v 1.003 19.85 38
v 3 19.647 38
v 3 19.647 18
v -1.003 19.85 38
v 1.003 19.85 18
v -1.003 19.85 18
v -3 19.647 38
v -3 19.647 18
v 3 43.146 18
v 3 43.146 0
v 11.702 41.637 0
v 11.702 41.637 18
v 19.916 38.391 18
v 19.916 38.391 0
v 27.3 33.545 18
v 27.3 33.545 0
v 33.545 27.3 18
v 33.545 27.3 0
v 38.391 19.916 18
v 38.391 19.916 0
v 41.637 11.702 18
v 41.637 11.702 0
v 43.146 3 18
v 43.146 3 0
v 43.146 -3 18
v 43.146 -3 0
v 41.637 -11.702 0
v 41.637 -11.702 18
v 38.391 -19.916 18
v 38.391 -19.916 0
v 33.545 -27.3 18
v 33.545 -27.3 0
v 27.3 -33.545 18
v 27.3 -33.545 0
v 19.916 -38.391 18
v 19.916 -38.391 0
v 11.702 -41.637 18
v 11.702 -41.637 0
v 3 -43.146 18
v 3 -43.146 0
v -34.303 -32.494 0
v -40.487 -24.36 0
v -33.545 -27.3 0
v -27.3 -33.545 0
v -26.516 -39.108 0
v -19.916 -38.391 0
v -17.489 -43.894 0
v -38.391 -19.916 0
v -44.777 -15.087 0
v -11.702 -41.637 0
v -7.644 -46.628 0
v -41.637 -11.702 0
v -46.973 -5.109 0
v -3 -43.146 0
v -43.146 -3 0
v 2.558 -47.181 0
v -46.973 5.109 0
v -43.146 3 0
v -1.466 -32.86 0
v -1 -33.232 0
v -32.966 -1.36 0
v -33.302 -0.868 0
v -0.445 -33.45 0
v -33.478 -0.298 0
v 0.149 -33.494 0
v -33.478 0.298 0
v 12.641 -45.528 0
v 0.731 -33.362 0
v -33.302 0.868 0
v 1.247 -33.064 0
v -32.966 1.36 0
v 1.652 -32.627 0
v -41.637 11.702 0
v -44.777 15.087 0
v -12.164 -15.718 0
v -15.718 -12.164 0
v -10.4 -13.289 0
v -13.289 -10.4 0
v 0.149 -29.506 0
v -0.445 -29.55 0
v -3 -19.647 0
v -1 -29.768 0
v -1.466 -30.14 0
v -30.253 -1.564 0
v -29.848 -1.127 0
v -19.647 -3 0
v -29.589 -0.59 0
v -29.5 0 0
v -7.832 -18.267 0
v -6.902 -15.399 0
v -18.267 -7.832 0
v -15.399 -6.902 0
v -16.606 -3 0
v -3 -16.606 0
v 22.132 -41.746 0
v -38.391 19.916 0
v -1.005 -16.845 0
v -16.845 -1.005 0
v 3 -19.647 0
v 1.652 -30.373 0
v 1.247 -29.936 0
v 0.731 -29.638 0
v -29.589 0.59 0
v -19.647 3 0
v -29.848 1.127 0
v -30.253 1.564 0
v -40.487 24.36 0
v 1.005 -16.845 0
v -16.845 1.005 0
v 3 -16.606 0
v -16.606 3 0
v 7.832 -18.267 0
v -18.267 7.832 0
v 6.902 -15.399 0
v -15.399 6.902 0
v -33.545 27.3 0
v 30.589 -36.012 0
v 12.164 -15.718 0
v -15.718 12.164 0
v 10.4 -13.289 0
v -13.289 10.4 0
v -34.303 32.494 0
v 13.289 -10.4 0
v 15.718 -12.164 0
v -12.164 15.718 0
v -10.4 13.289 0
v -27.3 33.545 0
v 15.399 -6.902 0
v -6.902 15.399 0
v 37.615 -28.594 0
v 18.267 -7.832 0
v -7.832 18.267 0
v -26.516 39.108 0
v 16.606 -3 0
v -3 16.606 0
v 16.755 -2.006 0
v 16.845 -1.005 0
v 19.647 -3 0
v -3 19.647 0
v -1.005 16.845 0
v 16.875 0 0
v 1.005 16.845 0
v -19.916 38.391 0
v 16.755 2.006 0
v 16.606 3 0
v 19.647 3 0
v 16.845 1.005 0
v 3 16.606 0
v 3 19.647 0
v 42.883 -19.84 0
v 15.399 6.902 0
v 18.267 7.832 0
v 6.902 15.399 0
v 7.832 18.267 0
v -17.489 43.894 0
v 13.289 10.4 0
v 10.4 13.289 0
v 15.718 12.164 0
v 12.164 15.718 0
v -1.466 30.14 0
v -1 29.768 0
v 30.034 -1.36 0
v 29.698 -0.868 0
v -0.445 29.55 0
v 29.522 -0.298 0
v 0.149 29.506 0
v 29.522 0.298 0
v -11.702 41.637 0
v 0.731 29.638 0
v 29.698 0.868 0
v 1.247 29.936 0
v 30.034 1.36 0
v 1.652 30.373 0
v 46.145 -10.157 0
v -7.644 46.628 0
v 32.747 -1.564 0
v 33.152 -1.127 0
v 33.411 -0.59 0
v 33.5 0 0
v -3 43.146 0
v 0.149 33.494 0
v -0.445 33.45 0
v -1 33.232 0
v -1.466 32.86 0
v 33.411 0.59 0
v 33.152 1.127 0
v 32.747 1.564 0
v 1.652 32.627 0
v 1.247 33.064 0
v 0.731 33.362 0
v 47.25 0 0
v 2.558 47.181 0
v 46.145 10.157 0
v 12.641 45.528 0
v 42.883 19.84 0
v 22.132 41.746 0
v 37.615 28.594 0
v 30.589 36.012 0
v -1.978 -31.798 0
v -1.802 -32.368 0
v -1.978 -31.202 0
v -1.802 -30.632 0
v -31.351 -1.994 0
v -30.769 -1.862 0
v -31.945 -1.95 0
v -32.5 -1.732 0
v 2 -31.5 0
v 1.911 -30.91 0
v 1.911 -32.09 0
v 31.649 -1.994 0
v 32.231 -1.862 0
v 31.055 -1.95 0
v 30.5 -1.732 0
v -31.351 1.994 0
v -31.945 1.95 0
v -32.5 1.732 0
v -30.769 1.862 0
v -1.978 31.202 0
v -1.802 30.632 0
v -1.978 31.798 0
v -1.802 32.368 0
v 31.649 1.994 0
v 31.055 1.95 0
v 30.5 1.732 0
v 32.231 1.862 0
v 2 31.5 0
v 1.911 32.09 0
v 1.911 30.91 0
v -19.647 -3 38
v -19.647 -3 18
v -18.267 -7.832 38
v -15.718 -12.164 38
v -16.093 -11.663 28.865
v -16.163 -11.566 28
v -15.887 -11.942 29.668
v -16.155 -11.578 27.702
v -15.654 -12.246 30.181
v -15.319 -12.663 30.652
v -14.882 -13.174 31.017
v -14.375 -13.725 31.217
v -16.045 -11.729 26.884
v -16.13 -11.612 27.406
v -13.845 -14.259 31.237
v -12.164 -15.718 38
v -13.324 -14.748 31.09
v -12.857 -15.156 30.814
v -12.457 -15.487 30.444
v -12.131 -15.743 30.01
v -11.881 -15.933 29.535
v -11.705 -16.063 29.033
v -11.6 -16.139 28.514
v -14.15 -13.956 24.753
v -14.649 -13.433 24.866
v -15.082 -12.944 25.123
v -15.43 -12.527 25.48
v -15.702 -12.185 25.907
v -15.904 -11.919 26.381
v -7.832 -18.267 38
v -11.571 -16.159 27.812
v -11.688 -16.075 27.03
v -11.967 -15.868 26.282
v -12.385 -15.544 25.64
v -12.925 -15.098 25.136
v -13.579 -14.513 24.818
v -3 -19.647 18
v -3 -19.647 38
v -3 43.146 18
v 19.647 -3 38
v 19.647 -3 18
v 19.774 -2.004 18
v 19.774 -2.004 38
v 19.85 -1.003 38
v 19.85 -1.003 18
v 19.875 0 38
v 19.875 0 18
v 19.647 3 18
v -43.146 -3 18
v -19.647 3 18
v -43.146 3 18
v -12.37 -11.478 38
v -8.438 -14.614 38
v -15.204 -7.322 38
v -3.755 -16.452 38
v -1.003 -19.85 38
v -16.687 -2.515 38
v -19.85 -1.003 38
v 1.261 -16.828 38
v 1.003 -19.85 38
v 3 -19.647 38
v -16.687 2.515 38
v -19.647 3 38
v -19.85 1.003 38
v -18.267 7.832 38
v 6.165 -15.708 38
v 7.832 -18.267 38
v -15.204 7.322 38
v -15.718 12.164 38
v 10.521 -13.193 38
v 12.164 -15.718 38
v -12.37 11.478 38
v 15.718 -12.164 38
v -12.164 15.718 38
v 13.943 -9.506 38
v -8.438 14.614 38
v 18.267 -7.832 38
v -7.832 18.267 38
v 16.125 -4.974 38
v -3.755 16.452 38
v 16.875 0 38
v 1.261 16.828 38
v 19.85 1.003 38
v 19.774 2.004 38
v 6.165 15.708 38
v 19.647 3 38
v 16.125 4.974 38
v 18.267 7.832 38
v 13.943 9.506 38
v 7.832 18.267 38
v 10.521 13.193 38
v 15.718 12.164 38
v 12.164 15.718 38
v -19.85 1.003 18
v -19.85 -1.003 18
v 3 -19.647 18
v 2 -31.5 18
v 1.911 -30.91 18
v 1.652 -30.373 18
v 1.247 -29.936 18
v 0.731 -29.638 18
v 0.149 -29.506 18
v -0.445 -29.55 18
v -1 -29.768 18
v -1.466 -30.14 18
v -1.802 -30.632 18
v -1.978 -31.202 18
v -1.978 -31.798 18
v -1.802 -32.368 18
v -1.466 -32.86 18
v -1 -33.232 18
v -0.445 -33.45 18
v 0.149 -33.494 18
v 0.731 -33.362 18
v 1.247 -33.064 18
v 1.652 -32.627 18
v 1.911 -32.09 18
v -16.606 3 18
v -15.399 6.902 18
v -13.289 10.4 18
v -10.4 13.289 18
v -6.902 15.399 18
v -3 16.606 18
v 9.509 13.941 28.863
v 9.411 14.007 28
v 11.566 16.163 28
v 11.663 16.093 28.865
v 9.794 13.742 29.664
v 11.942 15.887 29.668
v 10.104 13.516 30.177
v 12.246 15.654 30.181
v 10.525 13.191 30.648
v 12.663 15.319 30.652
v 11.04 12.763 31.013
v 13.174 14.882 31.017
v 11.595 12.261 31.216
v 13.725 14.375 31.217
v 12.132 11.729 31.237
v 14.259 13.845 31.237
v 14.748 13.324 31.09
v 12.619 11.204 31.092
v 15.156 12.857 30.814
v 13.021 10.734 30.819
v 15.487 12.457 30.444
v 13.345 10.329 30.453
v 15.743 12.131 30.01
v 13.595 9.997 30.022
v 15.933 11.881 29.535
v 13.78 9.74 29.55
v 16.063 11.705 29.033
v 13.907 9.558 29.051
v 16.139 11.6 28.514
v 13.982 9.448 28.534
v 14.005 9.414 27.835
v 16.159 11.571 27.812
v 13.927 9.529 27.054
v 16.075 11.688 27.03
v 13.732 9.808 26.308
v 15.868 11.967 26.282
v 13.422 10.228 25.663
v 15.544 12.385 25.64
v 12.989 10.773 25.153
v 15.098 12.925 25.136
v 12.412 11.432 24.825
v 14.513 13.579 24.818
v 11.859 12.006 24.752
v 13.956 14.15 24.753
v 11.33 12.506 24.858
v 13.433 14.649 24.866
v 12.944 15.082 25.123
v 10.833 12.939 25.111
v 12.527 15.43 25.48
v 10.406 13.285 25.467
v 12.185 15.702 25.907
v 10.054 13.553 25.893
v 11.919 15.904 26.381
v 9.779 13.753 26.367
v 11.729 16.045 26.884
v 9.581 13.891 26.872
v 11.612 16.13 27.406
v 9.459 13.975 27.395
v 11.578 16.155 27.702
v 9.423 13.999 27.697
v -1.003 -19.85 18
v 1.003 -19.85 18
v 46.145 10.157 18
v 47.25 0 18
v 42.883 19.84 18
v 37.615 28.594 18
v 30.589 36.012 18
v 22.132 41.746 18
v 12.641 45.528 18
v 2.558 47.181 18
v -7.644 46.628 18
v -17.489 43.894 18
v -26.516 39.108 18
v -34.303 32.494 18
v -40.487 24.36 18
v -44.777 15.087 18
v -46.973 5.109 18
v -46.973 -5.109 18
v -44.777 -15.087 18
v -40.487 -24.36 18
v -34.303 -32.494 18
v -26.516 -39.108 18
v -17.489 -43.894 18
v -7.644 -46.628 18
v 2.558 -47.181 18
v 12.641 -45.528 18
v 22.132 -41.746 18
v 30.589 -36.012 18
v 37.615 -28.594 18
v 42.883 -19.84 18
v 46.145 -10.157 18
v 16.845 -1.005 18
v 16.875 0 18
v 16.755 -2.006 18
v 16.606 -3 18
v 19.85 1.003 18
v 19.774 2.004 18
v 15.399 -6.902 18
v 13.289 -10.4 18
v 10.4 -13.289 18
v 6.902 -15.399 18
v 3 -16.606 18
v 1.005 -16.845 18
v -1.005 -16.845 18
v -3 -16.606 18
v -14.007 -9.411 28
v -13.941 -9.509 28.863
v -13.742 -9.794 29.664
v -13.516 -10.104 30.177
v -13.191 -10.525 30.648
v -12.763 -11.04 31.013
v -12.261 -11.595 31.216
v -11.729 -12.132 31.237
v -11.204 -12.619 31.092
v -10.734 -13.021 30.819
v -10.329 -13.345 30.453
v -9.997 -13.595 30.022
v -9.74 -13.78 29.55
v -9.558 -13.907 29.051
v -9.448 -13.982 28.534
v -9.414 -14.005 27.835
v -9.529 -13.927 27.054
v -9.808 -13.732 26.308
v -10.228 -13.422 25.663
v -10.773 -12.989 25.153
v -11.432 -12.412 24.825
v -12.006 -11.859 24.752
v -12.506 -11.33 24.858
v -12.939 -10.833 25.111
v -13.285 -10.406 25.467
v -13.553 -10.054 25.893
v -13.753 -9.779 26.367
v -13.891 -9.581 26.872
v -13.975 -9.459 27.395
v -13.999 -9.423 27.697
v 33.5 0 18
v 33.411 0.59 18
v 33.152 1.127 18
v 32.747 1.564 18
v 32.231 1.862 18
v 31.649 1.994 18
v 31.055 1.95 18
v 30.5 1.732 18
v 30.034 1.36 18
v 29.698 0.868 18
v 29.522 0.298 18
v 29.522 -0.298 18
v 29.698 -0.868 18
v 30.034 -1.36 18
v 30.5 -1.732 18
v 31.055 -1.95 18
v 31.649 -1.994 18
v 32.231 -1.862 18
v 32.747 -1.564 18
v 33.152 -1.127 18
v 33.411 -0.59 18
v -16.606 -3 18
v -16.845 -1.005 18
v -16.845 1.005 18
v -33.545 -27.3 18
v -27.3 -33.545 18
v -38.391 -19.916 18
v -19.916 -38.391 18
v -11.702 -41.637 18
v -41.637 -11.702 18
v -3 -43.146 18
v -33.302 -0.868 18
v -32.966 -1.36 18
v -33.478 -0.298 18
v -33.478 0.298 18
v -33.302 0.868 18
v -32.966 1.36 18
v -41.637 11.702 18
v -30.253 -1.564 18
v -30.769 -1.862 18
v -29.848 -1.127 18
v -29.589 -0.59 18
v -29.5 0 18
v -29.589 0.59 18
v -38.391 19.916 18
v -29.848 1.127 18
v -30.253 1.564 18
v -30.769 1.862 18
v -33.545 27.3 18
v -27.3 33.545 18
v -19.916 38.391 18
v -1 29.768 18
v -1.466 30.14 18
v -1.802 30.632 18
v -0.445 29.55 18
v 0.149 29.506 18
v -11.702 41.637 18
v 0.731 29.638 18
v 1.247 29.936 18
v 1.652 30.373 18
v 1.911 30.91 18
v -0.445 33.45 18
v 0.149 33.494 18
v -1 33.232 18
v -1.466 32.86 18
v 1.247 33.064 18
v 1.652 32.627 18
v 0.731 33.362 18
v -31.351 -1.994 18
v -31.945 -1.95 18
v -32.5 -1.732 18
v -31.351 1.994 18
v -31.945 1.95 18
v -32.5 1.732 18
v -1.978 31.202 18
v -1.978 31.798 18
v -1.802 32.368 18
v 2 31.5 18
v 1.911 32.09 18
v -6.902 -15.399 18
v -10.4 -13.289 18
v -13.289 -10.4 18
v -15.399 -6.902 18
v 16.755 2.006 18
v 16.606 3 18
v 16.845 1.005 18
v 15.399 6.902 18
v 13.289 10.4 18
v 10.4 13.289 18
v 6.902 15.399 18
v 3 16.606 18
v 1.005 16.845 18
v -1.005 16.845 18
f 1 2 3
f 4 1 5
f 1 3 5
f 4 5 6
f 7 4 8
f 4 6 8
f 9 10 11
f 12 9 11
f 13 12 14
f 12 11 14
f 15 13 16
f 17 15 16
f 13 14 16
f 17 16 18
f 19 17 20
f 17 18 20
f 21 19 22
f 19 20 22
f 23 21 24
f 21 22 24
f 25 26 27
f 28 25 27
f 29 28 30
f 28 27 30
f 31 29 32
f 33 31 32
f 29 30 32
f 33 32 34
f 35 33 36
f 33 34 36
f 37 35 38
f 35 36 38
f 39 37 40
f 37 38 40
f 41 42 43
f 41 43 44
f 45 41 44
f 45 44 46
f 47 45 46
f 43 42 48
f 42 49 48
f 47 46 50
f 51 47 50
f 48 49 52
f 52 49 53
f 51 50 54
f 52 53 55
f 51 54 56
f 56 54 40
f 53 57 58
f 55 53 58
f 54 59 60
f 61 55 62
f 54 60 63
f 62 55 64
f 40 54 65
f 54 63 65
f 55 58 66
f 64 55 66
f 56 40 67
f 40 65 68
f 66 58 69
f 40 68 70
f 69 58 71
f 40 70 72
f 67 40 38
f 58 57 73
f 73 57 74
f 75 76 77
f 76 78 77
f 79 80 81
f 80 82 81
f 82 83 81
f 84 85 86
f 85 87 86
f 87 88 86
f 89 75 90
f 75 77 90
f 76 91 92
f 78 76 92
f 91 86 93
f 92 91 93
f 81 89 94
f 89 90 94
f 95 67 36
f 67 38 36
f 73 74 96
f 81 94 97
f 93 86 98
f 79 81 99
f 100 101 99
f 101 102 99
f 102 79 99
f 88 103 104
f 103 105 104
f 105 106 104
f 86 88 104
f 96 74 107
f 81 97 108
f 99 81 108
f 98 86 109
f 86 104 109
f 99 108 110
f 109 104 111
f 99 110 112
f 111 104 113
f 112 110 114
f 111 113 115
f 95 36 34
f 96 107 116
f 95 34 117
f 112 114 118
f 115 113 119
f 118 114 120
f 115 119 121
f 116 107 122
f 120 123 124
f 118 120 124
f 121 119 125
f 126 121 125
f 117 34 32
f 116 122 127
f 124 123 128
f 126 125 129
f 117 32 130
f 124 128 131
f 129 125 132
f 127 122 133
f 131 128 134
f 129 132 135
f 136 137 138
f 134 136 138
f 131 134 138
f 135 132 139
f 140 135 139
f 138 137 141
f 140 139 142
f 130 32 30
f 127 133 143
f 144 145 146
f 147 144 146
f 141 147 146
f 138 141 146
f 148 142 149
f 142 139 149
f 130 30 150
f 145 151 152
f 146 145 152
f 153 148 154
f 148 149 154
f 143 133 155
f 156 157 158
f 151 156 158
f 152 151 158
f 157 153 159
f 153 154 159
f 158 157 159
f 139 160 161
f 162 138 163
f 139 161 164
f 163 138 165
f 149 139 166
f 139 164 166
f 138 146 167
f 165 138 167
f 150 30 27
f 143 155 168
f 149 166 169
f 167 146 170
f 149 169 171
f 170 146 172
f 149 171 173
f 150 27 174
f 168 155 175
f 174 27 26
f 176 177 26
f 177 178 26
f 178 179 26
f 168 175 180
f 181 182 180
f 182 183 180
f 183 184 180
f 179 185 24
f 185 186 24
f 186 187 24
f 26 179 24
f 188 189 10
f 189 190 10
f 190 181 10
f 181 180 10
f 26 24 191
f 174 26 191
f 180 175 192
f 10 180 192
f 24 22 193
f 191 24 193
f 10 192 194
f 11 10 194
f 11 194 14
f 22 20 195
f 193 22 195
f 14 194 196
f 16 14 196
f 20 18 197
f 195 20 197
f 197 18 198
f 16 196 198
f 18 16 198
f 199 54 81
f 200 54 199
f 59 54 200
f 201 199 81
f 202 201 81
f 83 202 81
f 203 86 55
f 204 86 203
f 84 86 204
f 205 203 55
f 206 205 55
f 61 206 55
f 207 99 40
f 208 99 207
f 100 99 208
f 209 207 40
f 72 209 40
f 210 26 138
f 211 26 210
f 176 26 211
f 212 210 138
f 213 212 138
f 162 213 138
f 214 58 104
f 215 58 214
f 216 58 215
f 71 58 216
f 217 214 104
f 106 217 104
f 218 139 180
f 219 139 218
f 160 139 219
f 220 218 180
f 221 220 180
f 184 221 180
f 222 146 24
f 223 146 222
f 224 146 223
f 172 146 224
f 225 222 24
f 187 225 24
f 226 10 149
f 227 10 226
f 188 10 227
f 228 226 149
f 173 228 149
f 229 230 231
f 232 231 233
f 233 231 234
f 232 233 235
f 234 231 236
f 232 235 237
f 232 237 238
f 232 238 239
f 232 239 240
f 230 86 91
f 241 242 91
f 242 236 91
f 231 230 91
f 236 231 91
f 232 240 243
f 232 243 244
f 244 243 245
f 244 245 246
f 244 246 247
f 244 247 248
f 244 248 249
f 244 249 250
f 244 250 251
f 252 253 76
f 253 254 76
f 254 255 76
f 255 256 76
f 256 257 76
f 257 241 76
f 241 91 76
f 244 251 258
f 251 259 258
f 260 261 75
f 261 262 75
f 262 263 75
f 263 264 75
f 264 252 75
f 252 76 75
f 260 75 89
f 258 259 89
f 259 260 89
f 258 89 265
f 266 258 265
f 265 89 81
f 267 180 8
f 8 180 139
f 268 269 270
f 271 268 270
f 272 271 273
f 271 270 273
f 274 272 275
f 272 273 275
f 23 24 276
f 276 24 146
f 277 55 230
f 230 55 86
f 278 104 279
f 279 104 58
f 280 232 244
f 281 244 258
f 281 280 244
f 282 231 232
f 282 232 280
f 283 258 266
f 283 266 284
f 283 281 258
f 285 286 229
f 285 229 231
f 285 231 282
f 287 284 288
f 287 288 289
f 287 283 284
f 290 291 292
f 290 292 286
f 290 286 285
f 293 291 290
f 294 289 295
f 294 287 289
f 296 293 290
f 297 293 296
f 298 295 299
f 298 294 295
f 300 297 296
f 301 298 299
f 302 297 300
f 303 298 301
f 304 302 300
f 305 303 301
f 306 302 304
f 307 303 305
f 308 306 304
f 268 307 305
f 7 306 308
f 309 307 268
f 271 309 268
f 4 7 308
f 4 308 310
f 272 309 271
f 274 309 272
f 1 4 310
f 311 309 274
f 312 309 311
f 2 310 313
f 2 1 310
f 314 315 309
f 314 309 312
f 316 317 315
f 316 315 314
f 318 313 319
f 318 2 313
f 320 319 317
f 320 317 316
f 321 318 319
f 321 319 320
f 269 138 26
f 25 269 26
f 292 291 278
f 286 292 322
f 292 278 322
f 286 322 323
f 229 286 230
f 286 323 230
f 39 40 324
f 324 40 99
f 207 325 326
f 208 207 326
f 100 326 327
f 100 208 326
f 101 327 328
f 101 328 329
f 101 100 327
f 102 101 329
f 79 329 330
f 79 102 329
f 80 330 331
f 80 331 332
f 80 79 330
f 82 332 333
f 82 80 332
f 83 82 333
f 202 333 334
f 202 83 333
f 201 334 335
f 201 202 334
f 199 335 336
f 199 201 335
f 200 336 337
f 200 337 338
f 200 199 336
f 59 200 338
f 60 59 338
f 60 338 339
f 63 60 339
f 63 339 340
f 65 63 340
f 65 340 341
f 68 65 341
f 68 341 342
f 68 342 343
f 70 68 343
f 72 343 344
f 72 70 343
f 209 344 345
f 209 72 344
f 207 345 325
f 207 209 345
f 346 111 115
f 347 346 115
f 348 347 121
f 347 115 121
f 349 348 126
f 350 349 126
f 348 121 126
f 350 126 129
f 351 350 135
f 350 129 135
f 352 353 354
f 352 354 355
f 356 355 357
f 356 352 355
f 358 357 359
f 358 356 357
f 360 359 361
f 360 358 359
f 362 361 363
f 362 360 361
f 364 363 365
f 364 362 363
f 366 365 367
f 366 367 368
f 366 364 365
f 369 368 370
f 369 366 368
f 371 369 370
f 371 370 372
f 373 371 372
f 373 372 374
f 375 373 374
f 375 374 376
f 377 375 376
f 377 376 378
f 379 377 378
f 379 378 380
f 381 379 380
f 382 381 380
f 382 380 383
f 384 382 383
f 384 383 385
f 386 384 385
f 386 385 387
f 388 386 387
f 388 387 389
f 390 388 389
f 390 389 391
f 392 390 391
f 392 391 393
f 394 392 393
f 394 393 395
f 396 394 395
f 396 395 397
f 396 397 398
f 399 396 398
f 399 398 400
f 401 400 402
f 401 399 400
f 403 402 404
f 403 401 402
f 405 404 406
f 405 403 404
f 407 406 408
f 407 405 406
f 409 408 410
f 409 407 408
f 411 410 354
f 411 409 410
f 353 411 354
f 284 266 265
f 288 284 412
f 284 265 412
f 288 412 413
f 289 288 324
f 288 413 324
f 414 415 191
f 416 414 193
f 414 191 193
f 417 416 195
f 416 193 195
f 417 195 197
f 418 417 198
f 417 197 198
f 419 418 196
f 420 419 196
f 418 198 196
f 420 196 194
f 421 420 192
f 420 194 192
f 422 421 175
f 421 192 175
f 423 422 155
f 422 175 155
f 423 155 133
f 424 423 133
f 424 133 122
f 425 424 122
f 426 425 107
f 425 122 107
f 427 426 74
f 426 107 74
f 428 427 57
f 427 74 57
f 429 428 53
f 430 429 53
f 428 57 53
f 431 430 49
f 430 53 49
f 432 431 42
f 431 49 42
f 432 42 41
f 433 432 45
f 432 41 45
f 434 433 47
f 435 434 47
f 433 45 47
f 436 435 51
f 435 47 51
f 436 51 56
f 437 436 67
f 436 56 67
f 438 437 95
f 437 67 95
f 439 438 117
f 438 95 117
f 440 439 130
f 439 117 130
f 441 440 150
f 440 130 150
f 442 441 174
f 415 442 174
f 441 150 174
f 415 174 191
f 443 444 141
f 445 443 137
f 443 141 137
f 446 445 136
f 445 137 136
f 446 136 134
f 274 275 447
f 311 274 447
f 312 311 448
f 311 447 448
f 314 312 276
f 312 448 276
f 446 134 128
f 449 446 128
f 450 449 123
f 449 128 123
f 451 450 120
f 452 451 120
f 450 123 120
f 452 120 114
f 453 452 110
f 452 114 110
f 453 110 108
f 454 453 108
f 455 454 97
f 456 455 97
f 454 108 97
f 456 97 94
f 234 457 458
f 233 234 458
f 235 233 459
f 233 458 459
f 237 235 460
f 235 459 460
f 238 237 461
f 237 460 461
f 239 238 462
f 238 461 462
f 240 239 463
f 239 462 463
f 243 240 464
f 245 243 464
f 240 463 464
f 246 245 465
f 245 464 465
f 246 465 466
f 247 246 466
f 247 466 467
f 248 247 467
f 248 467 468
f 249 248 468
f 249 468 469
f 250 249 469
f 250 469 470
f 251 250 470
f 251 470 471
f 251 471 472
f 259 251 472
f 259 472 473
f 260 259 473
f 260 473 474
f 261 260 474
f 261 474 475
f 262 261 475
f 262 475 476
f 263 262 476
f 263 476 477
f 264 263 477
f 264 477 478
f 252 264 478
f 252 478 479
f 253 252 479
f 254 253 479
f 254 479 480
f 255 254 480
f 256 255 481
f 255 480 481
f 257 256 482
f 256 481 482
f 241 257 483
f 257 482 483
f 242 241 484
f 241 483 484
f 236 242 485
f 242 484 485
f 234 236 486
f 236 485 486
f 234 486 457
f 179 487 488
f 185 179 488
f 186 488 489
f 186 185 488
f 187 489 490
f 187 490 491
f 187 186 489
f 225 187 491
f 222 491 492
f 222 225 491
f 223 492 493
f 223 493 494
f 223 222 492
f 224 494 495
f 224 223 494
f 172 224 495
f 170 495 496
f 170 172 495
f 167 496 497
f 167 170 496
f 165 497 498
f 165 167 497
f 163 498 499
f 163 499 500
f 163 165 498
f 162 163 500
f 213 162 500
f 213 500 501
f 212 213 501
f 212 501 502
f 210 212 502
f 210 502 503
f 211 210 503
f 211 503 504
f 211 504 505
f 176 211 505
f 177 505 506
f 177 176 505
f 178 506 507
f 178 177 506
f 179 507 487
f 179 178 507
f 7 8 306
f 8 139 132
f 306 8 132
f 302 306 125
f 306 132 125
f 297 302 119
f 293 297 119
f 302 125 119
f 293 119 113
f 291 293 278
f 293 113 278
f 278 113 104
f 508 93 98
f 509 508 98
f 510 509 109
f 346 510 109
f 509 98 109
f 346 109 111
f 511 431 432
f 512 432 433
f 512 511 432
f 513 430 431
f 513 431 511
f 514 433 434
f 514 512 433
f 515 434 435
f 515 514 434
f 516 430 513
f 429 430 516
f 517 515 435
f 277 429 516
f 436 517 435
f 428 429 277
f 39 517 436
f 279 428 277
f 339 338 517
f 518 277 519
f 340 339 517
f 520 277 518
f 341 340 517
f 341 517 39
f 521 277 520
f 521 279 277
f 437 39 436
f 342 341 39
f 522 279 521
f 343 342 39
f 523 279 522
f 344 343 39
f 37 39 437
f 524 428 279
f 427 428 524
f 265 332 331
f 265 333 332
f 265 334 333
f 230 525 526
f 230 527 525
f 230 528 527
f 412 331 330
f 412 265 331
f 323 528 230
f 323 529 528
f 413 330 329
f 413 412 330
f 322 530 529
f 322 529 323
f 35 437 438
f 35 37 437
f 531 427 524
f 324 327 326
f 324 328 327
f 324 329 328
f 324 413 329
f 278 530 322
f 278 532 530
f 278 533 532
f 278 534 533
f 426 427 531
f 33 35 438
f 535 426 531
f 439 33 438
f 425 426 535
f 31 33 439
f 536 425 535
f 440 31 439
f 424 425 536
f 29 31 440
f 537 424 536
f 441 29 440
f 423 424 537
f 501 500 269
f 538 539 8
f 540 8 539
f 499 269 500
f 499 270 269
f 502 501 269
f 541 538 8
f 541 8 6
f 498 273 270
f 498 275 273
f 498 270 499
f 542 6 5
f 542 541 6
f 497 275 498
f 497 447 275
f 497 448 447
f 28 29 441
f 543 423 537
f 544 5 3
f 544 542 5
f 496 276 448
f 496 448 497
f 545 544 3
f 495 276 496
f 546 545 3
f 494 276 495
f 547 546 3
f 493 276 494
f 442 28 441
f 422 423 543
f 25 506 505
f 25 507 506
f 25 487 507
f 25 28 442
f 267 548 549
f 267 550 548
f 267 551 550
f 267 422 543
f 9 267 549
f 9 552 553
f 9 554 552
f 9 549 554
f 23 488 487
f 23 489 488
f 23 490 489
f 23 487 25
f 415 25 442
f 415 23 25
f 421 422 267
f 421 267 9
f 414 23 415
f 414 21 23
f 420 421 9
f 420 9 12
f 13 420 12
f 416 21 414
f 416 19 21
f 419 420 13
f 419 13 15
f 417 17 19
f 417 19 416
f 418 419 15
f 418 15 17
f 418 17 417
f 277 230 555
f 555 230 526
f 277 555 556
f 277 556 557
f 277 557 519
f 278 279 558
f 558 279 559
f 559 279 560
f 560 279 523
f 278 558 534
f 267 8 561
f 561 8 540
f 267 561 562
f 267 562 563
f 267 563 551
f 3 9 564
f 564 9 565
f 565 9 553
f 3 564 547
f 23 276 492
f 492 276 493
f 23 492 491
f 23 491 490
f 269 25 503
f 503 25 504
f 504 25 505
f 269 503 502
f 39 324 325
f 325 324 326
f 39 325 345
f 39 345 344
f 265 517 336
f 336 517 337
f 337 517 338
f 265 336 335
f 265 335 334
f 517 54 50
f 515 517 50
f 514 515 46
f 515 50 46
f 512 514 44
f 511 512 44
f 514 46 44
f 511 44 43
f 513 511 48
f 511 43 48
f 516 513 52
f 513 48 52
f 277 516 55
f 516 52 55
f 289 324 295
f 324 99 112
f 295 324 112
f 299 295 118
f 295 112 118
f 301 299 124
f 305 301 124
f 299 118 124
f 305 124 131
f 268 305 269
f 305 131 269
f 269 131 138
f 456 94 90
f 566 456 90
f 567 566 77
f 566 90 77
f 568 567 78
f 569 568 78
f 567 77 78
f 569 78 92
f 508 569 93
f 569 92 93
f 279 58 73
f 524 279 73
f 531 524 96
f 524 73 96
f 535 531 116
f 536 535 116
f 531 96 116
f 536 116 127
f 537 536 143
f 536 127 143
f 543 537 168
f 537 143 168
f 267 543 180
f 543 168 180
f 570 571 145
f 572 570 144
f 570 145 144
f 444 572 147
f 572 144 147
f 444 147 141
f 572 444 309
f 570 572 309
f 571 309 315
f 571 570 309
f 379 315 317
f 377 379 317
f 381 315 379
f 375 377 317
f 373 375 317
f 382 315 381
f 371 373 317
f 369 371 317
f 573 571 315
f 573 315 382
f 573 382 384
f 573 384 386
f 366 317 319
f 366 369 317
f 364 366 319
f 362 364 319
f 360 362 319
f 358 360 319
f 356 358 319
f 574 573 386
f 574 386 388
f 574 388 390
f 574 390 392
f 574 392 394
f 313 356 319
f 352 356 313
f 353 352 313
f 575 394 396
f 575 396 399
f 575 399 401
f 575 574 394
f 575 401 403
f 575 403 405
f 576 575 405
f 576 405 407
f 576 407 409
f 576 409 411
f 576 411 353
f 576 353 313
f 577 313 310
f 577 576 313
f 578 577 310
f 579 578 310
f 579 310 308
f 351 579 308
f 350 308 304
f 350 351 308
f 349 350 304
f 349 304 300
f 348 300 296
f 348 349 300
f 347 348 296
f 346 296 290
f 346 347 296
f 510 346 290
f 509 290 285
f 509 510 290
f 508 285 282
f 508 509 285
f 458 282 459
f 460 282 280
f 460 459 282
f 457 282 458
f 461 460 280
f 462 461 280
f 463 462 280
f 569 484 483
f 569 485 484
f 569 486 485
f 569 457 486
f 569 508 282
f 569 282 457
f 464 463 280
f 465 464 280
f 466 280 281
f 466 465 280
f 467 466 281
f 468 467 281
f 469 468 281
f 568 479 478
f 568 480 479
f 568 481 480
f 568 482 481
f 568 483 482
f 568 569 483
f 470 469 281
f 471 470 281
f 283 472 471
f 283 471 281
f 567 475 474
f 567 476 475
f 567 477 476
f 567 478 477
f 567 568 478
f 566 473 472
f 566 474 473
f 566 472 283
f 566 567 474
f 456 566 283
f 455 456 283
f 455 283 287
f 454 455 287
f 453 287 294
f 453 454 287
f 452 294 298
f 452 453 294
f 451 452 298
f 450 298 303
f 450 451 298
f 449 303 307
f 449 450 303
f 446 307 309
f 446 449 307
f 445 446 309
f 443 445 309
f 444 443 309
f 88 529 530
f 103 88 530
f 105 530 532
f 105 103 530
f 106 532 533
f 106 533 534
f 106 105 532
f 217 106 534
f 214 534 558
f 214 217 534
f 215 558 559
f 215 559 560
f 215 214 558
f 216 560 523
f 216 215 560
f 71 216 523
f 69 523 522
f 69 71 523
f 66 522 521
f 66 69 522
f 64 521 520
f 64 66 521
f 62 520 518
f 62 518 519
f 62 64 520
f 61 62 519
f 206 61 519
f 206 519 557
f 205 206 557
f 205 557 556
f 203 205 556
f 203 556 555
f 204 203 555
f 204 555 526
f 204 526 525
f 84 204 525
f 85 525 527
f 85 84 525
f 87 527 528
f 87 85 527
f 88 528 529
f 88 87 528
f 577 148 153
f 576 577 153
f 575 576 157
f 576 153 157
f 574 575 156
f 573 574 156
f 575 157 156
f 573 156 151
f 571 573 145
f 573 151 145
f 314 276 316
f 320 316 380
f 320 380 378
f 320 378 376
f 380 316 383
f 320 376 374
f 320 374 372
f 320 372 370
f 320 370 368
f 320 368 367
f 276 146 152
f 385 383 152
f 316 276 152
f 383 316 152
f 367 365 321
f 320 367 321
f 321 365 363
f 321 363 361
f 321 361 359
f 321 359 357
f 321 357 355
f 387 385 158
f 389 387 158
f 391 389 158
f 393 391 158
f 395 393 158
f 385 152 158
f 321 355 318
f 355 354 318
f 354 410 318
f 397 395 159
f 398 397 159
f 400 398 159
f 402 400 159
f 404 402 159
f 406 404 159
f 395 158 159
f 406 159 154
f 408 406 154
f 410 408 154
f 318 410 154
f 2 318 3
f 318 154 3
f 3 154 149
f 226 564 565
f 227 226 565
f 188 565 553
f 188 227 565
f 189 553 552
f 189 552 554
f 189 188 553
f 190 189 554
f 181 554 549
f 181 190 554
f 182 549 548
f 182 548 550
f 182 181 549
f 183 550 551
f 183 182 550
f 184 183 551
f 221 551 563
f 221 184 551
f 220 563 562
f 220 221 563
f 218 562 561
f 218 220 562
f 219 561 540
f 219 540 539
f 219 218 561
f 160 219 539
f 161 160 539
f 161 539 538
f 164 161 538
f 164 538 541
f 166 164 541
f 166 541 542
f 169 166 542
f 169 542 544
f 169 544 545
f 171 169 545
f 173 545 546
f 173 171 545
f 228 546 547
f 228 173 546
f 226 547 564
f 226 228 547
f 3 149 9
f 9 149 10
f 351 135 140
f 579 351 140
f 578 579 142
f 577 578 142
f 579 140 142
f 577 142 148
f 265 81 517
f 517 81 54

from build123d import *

# Parameters (mm, degrees)
F0_R     = 47.25
F0_R_2   = 2
F1_DEPTH = 18
F2_R     = 16.875
F3_DEPTH = 20
F7_R     = 3.25
F8_DEPTH = 25
F9_DEPTH = 25


with BuildPart() as f1:
    # F0 (on Top) → F1 (new body)
    with BuildSketch(Plane.XY):
        Circle(F0_R)
        with BuildLine():
            ThreePointArc((3, 43.1458283036), (30.5823682863, 30.5823682863), (43.1458283036, 3))
            ThreePointArc((43.1458283036, 3), (43.2239492303, 1.5009040394), (43.25, 0))
            ThreePointArc((43.25, 0), (43.2239492303, -1.5009040394), (43.1458283036, -3))
            ThreePointArc((43.1458283036, -3), (30.5823682863, -30.5823682863), (3, -43.1458283036))
            ThreePointArc((3, -43.1458283036), (0, -43.25), (-3, -43.1458283036))
            ThreePointArc((-3, -43.1458283036), (-30.5823682863, -30.5823682863), (-43.1458283036, -3))
            ThreePointArc((-43.1458283036, -3), (-43.25, 0), (-43.1458283036, 3))
            ThreePointArc((-43.1458283036, 3), (-30.5823682863, 30.5823682863), (-3, 43.1458283036))
            ThreePointArc((-3, 43.1458283036), (0, 43.25), (3, 43.1458283036))
        make_face(mode=Mode.SUBTRACT)
        with BuildLine():
            Line((43.1458283036, 3), (19.6472803461, 3))
            ThreePointArc((19.6472803461, 3), (19.8179883172, 1.5043151466), (19.875, 0))
            ThreePointArc((19.875, 0), (19.8179883172, -1.5043151466), (19.6472803461, -3))
            Line((19.6472803461, -3), (43.1458283036, -3))
            ThreePointArc((43.1458283036, -3), (43.2239492303, -1.5009040394), (43.25, 0))
            ThreePointArc((43.25, 0), (43.2239492303, 1.5009040394), (43.1458283036, 3))
        make_face()
        with Locations((31.5, 0)):
            Circle(F0_R_2, mode=Mode.SUBTRACT)
        with BuildLine():
            ThreePointArc((-19.6472803461, -3), (-19.875, 0), (-19.6472803461, 3))
            Line((-19.6472803461, 3), (-43.1458283036, 3))
            ThreePointArc((-43.1458283036, 3), (-43.25, 0), (-43.1458283036, -3))
            Line((-43.1458283036, -3), (-19.6472803461, -3))
        make_face()
        with Locations((-31.5, 0)):
            Circle(F0_R_2, mode=Mode.SUBTRACT)
        with BuildLine():
            ThreePointArc((-3, 19.6472803461), (0, 19.875), (3, 19.6472803461))
            Line((3, 19.6472803461), (3, 43.1458283036))
            ThreePointArc((3, 43.1458283036), (0, 43.25), (-3, 43.1458283036))
            Line((-3, 43.1458283036), (-3, 19.6472803461))
        make_face()
        with Locations((0, 31.5)):
            Circle(F0_R_2, mode=Mode.SUBTRACT)
        with BuildLine():
            Line((3, -43.1458283036), (3, -19.6472803461))
            ThreePointArc((3, -19.6472803461), (0, -19.875), (-3, -19.6472803461))
            Line((-3, -19.6472803461), (-3, -43.1458283036))
            ThreePointArc((-3, -43.1458283036), (0, -43.25), (3, -43.1458283036))
        make_face()
        with Locations((0, -31.5)):
            Circle(F0_R_2, mode=Mode.SUBTRACT)
        with BuildLine():
            Line((-3, -19.6472803461), (-3, -16.6061923691))
            ThreePointArc((-3, -16.6061923691), (-11.9324269325, -11.9324269325), (-16.6061923691, -3))
            Line((-16.6061923691, -3), (-19.6472803461, -3))
            ThreePointArc((-19.6472803461, -3), (-14.0537472761, -14.0537472761), (-3, -19.6472803461))
        make_face()
        with BuildLine():
            Line((19.6472803461, -3), (16.6061923691, -3))
            ThreePointArc((16.6061923691, -3), (11.9324269325, -11.9324269325), (3, -16.6061923691))
            Line((3, -16.6061923691), (3, -19.6472803461))
            ThreePointArc((3, -19.6472803461), (14.0537472761, -14.0537472761), (19.6472803461, -3))
        make_face()
        with BuildLine():
            ThreePointArc((3, 16.6061923691), (11.9324269325, 11.9324269325), (16.6061923691, 3))
            Line((16.6061923691, 3), (19.6472803461, 3))
            ThreePointArc((19.6472803461, 3), (14.0537472761, 14.0537472761), (3, 19.6472803461))
            Line((3, 19.6472803461), (3, 16.6061923691))
        make_face()
        with BuildLine():
            ThreePointArc((-16.6061923691, 3), (-11.9324269325, 11.9324269325), (-3, 16.6061923691))
            Line((-3, 16.6061923691), (-3, 19.6472803461))
            ThreePointArc((-3, 19.6472803461), (-14.0537472761, 14.0537472761), (-19.6472803461, 3))
            Line((-19.6472803461, 3), (-16.6061923691, 3))
        make_face()
        with BuildLine():
            ThreePointArc((-3, 16.6061923691), (0, 16.875), (3, 16.6061923691))
            Line((3, 16.6061923691), (3, 19.6472803461))
            ThreePointArc((3, 19.6472803461), (0, 19.875), (-3, 19.6472803461))
            Line((-3, 19.6472803461), (-3, 16.6061923691))
        make_face()
        with BuildLine():
            ThreePointArc((16.6061923691, 3), (16.8076637465, 1.5060094241), (16.875, 0))
            ThreePointArc((16.875, 0), (16.8076637465, -1.5060094241), (16.6061923691, -3))
            Line((16.6061923691, -3), (19.6472803461, -3))
            ThreePointArc((19.6472803461, -3), (19.8179883172, -1.5043151466), (19.875, 0))
            ThreePointArc((19.875, 0), (19.8179883172, 1.5043151466), (19.6472803461, 3))
            Line((19.6472803461, 3), (16.6061923691, 3))
        make_face()
        with BuildLine():
            ThreePointArc((-16.6061923691, -3), (-16.875, 0), (-16.6061923691, 3))
            Line((-16.6061923691, 3), (-19.6472803461, 3))
            ThreePointArc((-19.6472803461, 3), (-19.875, 0), (-19.6472803461, -3))
            Line((-19.6472803461, -3), (-16.6061923691, -3))
        make_face()
        with BuildLine():
            Line((3, -19.6472803461), (3, -16.6061923691))
            ThreePointArc((3, -16.6061923691), (0, -16.875), (-3, -16.6061923691))
            Line((-3, -16.6061923691), (-3, -19.6472803461))
            ThreePointArc((-3, -19.6472803461), (0, -19.875), (3, -19.6472803461))
        make_face()
    extrude(amount=F1_DEPTH)

    # F2 (on face) → F3 (join)
    with BuildSketch(Plane.XY.offset(18)):
        with BuildLine():
            ThreePointArc((19.6472803461, -3), (19.8179883172, -1.5043151466), (19.875, 0))
            ThreePointArc((19.875, 0), (19.8179883172, 1.5043151466), (19.6472803461, 3))
            ThreePointArc((19.6472803461, 3), (14.0537472761, 14.0537472761), (3, 19.6472803461))
            ThreePointArc((3, 19.6472803461), (0, 19.875), (-3, 19.6472803461))
            ThreePointArc((-3, 19.6472803461), (-14.0537472761, 14.0537472761), (-19.6472803461, 3))
            ThreePointArc((-19.6472803461, 3), (-19.875, 0), (-19.6472803461, -3))
            ThreePointArc((-19.6472803461, -3), (-14.0537472761, -14.0537472761), (-3, -19.6472803461))
            ThreePointArc((-3, -19.6472803461), (0, -19.875), (3, -19.6472803461))
            ThreePointArc((3, -19.6472803461), (14.0537472761, -14.0537472761), (19.6472803461, -3))
        make_face()
        Circle(F2_R, mode=Mode.SUBTRACT)
    extrude(amount=F3_DEPTH)

    # F7 (on line) → F8 (cut)
    with BuildSketch(Plane(origin=(0, 0, 0), x_dir=(-0.7071067812, 0.7071067812, 0), z_dir=(0.7071067812, 0.7071067812, 0))):
        with Locations((0, 28)):
            Circle(F7_R)
    extrude(amount=-F8_DEPTH, mode=Mode.SUBTRACT)

    # F7 (on line) → F9 (cut)
    with BuildSketch(Plane(origin=(0, 0, 0), x_dir=(-0.7071067812, 0.7071067812, 0), z_dir=(0.7071067812, 0.7071067812, 0))):
        with Locations((0, 28)):
            Circle(F7_R)
    extrude(amount=F9_DEPTH, mode=Mode.SUBTRACT)


solid = f1.part
